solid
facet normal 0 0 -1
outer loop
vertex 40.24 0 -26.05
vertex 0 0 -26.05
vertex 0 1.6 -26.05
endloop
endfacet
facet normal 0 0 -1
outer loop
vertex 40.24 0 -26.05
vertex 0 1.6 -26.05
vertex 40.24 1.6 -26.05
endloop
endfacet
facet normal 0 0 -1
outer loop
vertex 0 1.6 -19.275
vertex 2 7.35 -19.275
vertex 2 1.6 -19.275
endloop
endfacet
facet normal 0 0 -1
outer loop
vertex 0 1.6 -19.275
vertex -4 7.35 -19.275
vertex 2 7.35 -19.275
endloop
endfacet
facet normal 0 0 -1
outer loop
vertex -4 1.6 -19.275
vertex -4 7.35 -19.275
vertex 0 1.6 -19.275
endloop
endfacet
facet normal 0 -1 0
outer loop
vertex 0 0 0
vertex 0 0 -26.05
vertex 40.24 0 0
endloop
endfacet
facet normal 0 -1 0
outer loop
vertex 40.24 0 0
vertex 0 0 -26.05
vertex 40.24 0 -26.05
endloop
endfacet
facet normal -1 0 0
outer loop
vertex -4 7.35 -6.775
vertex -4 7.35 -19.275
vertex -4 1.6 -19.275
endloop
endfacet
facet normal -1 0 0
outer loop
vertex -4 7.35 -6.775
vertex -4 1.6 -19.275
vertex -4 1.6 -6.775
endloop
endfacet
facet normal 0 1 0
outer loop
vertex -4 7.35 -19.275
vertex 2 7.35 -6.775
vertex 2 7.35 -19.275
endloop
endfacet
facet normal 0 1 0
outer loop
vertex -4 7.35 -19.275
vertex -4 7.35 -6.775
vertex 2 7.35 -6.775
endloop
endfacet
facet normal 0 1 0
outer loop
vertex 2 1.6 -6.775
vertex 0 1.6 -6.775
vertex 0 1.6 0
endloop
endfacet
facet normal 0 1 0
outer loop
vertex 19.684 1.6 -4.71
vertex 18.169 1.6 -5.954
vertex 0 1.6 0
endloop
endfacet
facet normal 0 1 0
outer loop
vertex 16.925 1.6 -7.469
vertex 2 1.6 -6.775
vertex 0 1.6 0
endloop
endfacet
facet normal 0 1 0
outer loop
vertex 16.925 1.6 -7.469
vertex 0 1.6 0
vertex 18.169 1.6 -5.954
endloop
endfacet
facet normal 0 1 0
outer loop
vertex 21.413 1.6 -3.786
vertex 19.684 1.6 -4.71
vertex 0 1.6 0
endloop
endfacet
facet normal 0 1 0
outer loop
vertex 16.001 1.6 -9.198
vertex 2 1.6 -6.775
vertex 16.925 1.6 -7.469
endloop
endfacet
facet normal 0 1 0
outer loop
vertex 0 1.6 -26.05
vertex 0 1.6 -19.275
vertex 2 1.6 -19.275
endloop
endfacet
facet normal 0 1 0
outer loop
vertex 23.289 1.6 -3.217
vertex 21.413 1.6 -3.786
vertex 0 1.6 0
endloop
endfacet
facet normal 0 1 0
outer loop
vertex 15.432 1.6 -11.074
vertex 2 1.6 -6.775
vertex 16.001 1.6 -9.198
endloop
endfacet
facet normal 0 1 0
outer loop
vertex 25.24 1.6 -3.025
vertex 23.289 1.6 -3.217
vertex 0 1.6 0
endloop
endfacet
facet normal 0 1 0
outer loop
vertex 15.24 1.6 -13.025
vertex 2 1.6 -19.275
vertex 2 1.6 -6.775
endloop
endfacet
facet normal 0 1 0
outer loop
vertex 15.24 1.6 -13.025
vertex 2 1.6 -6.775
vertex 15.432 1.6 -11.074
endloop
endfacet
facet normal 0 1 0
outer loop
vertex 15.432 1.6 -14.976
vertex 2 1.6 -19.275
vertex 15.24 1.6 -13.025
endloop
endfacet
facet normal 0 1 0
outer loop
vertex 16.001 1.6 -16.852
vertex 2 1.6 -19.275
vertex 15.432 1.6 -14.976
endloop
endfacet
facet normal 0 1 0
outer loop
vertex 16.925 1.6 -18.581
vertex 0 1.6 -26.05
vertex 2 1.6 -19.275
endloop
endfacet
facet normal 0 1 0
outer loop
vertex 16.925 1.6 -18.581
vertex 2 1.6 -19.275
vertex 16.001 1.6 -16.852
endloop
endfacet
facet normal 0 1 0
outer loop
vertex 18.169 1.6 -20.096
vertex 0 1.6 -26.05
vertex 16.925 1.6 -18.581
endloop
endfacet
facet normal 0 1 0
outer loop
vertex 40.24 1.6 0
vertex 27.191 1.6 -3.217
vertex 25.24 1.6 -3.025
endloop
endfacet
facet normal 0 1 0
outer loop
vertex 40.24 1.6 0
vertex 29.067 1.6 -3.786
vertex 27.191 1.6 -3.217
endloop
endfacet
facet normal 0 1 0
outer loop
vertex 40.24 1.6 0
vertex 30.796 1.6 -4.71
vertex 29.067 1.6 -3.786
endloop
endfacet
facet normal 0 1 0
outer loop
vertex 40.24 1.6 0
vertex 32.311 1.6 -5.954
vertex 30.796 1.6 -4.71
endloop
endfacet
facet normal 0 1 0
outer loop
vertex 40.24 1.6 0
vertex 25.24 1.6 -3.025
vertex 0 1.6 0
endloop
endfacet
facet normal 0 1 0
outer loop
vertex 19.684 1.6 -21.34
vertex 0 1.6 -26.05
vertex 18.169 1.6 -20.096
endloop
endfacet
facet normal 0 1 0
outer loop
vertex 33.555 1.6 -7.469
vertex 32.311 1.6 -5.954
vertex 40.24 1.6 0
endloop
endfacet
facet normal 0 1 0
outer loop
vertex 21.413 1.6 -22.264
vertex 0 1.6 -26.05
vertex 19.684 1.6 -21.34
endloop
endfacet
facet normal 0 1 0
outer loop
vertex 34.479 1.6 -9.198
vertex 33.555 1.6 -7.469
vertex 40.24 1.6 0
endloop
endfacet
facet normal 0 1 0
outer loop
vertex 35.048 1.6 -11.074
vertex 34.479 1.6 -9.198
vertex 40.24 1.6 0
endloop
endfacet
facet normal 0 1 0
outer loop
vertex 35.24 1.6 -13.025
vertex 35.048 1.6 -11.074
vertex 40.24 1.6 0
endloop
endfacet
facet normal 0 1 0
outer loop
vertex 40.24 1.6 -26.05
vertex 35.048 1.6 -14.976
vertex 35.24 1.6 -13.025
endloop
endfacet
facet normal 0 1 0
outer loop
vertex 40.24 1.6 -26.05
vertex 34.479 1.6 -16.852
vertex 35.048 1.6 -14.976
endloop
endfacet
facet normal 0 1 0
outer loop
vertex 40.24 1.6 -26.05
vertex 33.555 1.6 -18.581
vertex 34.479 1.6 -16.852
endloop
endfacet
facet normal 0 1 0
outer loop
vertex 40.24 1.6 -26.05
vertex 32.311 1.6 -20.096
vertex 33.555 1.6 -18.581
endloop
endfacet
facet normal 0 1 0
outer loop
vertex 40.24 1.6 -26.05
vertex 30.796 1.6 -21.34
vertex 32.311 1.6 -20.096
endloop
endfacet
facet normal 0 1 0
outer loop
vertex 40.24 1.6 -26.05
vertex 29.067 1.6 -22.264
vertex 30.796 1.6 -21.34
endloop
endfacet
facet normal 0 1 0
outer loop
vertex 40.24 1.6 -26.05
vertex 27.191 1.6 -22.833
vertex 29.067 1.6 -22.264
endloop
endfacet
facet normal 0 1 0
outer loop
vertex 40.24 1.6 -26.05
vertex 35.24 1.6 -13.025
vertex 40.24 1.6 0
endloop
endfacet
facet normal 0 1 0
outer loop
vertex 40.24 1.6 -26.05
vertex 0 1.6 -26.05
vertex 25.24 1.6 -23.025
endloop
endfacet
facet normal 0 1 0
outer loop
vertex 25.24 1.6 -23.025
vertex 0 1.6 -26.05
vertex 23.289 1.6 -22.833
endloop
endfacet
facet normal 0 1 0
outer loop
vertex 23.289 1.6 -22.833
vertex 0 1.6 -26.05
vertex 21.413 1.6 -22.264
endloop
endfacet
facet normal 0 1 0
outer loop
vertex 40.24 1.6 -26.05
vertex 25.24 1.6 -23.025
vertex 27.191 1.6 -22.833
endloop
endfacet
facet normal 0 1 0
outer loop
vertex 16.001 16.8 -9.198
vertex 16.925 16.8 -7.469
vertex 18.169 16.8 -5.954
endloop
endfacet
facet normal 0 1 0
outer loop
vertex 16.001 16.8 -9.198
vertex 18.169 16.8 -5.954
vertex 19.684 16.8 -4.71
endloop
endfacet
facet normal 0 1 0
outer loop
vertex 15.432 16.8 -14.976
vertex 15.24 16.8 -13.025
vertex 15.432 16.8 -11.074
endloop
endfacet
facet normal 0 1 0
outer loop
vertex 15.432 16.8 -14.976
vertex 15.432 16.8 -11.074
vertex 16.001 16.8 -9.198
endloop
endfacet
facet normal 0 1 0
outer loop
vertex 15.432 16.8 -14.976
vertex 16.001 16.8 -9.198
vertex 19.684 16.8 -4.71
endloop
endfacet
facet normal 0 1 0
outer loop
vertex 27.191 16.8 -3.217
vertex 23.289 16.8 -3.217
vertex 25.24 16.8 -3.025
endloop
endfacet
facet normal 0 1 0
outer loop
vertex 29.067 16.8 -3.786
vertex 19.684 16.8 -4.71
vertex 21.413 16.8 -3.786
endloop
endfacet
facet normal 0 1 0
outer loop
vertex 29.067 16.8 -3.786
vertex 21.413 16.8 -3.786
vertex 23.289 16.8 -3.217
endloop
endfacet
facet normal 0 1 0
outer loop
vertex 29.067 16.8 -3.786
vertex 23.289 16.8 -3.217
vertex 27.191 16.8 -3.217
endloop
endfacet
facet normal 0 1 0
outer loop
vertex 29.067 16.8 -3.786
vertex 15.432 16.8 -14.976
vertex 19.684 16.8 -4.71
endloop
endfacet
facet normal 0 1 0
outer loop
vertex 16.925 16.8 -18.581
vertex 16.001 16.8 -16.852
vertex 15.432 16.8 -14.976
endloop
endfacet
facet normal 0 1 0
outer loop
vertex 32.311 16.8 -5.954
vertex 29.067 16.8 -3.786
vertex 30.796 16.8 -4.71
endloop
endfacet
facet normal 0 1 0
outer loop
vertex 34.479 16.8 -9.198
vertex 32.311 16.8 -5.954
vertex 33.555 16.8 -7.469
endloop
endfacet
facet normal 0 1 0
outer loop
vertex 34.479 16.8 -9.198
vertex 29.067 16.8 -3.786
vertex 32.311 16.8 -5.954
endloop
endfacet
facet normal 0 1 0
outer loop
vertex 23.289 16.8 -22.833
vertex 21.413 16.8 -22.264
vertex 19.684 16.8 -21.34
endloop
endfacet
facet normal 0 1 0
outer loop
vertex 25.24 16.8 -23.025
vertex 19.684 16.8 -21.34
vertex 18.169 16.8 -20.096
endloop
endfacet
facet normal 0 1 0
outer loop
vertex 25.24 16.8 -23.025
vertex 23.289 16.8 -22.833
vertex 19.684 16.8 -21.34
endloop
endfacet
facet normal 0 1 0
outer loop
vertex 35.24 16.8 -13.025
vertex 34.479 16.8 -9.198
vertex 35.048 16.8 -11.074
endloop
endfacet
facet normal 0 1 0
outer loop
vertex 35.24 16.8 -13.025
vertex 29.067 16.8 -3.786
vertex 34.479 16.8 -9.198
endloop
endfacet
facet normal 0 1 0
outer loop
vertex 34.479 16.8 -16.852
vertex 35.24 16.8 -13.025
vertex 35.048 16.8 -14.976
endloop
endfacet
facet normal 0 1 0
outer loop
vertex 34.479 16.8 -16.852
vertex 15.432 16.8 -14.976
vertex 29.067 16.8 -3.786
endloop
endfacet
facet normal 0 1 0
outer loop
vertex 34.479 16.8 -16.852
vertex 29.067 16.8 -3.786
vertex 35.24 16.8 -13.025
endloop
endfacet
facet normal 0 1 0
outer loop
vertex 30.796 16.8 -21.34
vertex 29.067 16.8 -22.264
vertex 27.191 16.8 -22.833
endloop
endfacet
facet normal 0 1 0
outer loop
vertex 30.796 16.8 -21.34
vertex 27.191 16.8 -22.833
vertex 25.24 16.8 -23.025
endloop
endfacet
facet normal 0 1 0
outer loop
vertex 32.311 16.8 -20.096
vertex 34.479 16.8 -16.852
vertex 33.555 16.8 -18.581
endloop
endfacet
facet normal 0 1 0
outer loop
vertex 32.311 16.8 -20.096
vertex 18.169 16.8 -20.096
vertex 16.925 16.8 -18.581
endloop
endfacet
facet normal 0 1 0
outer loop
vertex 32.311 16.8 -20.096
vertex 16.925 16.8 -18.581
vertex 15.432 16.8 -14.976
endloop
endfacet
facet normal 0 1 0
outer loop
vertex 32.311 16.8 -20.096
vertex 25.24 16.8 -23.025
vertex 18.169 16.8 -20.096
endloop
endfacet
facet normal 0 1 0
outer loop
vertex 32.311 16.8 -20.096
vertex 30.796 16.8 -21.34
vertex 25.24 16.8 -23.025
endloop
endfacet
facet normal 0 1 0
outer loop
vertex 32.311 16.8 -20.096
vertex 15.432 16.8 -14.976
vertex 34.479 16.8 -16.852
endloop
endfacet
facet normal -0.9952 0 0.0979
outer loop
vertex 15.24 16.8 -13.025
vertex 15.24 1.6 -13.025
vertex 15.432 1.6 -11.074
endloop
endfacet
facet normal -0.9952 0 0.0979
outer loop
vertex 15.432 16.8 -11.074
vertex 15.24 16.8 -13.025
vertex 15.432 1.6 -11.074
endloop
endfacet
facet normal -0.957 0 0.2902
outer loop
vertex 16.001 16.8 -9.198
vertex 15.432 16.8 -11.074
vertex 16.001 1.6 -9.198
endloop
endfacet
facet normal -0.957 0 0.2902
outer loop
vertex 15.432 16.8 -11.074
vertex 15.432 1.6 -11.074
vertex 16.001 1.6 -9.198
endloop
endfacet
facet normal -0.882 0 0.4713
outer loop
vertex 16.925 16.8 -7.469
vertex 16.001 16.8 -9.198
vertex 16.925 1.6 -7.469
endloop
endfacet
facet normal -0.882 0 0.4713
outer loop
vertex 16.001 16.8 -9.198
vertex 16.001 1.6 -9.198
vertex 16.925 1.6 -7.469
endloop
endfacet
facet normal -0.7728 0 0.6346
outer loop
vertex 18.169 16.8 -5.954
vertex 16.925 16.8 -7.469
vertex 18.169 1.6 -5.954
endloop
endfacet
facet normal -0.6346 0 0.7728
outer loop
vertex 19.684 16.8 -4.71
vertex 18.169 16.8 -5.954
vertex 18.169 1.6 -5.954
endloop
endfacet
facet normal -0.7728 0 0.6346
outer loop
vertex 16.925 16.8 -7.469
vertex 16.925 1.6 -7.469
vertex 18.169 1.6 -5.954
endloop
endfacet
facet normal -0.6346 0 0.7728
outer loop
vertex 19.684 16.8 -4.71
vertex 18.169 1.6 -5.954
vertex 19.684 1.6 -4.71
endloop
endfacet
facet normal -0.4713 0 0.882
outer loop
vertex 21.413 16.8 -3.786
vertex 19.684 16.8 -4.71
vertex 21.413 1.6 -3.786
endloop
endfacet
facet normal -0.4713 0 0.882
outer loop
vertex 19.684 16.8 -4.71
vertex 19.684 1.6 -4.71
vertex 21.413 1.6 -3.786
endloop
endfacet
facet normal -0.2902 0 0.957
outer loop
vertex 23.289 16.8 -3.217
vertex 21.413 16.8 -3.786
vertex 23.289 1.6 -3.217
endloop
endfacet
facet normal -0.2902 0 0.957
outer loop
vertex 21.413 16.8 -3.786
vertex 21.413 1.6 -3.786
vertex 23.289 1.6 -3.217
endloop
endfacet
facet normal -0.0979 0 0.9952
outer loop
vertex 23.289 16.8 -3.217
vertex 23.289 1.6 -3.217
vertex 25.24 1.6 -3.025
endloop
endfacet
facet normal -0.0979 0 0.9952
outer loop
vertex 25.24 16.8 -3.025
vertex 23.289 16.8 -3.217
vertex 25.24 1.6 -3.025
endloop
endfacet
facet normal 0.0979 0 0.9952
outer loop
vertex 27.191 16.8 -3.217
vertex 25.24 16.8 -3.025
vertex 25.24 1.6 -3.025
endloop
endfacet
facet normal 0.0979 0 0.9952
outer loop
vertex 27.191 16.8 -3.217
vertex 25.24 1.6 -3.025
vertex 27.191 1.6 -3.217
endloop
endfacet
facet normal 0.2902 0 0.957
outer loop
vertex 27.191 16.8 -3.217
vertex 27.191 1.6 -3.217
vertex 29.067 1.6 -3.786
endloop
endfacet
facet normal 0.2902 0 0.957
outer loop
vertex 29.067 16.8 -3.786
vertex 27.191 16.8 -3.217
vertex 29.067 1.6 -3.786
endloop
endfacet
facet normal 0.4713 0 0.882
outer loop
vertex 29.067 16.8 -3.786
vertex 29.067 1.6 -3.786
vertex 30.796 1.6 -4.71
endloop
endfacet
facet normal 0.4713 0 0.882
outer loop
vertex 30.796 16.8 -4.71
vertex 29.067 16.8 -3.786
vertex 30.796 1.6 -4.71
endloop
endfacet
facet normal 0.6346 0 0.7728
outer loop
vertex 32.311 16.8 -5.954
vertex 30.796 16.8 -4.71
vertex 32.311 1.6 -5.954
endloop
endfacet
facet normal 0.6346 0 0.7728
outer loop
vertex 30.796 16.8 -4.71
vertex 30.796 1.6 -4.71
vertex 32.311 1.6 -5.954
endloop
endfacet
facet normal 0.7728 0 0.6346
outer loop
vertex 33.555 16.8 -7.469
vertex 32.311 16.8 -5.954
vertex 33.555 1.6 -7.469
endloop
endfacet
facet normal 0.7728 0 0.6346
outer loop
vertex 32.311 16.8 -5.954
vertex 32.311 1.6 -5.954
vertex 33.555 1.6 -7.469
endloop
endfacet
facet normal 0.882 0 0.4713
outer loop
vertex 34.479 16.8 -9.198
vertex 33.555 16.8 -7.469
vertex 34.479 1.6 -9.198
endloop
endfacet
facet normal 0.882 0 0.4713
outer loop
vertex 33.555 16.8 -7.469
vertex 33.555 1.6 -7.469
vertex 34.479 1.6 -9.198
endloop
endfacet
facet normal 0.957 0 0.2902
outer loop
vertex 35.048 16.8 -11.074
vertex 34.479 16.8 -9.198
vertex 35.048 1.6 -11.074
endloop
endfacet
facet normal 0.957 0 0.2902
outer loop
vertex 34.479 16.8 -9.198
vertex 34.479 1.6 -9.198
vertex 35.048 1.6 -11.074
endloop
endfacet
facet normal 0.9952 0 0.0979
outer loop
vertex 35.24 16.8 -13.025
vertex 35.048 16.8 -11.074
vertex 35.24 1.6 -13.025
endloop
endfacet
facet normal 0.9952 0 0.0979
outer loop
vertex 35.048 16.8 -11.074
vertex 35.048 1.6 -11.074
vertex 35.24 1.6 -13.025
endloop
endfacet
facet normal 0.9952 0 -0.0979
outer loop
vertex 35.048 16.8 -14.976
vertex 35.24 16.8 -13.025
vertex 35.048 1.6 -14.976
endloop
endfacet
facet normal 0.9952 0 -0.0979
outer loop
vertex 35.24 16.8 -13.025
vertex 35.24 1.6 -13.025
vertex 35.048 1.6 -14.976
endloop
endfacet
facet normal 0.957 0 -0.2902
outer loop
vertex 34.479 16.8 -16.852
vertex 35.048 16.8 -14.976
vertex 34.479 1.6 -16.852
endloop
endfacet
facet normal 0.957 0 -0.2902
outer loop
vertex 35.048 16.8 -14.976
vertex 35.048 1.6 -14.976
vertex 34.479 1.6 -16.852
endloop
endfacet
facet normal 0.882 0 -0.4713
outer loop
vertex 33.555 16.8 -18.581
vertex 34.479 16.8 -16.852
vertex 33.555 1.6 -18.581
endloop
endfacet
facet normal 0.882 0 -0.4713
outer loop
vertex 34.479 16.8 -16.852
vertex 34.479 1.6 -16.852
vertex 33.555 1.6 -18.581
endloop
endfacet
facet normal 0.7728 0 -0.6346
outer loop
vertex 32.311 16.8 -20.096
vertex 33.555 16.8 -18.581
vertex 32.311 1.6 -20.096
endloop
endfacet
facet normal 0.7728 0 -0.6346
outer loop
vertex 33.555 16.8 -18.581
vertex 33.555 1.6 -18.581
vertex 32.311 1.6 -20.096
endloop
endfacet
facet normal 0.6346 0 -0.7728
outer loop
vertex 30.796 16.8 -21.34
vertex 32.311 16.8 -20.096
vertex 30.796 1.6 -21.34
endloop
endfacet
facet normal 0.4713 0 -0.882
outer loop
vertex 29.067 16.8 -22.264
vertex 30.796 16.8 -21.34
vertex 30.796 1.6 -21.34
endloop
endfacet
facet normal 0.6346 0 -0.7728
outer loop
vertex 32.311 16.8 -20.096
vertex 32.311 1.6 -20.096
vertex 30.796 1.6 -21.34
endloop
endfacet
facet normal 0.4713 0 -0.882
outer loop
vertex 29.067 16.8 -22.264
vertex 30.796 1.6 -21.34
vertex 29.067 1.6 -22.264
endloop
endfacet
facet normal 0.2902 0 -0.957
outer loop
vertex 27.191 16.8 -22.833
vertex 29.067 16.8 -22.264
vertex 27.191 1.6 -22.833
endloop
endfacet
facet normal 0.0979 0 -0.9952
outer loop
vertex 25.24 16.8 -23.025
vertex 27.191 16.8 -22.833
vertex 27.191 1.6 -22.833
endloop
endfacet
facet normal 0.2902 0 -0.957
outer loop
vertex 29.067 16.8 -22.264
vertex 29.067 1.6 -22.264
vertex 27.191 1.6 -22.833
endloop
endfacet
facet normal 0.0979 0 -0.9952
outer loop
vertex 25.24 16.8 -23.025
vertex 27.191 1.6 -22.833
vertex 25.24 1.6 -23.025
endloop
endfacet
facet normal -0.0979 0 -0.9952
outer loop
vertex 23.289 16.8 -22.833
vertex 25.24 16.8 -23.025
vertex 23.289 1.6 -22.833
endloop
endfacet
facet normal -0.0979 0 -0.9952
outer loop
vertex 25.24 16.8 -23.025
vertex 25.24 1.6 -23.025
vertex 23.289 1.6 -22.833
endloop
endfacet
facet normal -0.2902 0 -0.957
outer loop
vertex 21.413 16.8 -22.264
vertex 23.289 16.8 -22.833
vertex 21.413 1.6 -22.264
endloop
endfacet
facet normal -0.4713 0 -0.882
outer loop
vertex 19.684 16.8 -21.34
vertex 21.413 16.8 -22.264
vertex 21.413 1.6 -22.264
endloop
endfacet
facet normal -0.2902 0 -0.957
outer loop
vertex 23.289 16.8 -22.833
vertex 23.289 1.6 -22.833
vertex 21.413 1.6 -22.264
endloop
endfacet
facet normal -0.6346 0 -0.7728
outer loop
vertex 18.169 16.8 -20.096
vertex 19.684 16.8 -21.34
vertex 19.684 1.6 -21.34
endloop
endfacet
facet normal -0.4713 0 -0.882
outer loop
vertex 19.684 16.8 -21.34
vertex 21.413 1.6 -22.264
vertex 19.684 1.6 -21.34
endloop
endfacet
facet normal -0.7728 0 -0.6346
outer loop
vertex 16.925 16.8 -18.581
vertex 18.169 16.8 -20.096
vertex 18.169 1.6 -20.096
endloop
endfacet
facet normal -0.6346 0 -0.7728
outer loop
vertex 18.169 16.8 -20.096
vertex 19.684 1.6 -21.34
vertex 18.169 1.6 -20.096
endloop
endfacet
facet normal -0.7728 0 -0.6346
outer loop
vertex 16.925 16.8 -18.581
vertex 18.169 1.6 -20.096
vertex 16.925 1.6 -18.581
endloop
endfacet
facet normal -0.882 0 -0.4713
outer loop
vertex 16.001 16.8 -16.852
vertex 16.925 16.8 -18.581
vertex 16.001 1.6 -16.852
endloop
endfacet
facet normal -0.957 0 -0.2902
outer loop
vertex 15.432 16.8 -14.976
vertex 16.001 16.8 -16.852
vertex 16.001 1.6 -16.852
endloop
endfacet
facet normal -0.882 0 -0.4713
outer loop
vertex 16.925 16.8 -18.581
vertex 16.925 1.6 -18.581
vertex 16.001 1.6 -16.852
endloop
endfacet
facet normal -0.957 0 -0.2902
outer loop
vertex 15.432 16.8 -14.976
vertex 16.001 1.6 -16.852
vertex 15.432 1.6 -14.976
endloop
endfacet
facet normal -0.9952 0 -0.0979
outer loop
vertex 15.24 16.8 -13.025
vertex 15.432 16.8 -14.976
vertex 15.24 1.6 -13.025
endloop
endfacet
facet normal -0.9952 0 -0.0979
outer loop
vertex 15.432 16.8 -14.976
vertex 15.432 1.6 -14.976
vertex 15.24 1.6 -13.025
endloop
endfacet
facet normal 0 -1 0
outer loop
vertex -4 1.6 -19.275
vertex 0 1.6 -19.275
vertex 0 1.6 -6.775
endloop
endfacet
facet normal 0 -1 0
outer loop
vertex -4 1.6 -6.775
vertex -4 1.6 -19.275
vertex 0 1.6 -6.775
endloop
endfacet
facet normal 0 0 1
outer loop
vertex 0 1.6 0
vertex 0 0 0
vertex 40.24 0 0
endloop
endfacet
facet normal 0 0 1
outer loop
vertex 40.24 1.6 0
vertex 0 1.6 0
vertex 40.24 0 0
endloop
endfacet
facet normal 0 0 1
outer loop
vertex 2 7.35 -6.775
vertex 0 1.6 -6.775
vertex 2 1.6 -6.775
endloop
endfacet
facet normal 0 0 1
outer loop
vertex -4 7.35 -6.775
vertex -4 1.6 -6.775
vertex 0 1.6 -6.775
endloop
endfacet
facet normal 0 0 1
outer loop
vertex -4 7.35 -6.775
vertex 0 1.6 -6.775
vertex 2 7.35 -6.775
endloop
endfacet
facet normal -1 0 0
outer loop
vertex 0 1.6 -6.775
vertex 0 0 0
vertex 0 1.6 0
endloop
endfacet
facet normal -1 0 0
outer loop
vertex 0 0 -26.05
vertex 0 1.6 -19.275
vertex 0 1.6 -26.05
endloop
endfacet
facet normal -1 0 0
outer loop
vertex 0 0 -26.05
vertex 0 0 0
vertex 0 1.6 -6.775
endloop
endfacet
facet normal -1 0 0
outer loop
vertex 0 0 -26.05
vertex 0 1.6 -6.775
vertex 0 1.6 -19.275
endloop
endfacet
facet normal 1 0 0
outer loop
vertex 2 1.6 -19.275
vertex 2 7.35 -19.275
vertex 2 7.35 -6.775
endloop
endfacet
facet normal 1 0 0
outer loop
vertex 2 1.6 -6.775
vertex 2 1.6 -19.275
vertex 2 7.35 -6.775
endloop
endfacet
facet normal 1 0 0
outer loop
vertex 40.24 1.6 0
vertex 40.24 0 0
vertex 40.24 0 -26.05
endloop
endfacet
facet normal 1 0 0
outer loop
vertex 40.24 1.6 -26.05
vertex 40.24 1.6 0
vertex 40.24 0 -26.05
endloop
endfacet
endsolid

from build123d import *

# Parameters (mm, degrees)
SKETCH_1_W           = 40.24
SKETCH_1_H           = 26.05
EXTRUDE_1_DEPTH      = 1.6
EXTRUDE_2_DEPTH      = 15.2
EXTRUDE_3_DEPTH      = 4
EXTRUDE_3_DEPTH_BACK = 2


with BuildPart() as part:
    # 草图1 → 凸台-拉伸1 (new body)
    with BuildSketch(Plane(origin=(0, 0, 0), x_dir=(1, 0, 0), z_dir=(0, 1, 0))):
        with Locations((20.12, 13.025)):
            Rectangle(SKETCH_1_W, SKETCH_1_H)
    extrude(amount=EXTRUDE_1_DEPTH)

    # 草图2 → 凸台-拉伸2 (add)
    with BuildSketch(Plane(origin=(0, 1.6, 0), x_dir=(1, 0, 0), z_dir=(0, 1, 0))):
        with BuildLine():
            Line((15.24, 13.025), (25.24, 13.025))
            Line((25.24, 13.025), (35.24, 13.025))
            ThreePointArc((35.24, 13.025), (25.24, 23.025), (15.24, 13.025))
        make_face()
        with BuildLine():
            Line((35.24, 13.025), (25.24, 13.025))
            Line((25.24, 13.025), (15.24, 13.025))
            ThreePointArc((15.24, 13.025), (25.24, 3.025), (35.24, 13.025))
        make_face()
    extrude(amount=EXTRUDE_2_DEPTH)

    # 草图3 → 凸台-拉伸3 (add, two sides)
    with BuildSketch(Plane.ZY) as extrude_3_sk:
        Polygon((-19.275, 7.35), (-19.275, 1.6), (-13.025, 1.6), (-6.775, 1.6), (-6.775, 7.35), align=None)
    extrude(amount=EXTRUDE_3_DEPTH)
    extrude(extrude_3_sk.sketch, amount=-EXTRUDE_3_DEPTH_BACK)


solid = part.part
